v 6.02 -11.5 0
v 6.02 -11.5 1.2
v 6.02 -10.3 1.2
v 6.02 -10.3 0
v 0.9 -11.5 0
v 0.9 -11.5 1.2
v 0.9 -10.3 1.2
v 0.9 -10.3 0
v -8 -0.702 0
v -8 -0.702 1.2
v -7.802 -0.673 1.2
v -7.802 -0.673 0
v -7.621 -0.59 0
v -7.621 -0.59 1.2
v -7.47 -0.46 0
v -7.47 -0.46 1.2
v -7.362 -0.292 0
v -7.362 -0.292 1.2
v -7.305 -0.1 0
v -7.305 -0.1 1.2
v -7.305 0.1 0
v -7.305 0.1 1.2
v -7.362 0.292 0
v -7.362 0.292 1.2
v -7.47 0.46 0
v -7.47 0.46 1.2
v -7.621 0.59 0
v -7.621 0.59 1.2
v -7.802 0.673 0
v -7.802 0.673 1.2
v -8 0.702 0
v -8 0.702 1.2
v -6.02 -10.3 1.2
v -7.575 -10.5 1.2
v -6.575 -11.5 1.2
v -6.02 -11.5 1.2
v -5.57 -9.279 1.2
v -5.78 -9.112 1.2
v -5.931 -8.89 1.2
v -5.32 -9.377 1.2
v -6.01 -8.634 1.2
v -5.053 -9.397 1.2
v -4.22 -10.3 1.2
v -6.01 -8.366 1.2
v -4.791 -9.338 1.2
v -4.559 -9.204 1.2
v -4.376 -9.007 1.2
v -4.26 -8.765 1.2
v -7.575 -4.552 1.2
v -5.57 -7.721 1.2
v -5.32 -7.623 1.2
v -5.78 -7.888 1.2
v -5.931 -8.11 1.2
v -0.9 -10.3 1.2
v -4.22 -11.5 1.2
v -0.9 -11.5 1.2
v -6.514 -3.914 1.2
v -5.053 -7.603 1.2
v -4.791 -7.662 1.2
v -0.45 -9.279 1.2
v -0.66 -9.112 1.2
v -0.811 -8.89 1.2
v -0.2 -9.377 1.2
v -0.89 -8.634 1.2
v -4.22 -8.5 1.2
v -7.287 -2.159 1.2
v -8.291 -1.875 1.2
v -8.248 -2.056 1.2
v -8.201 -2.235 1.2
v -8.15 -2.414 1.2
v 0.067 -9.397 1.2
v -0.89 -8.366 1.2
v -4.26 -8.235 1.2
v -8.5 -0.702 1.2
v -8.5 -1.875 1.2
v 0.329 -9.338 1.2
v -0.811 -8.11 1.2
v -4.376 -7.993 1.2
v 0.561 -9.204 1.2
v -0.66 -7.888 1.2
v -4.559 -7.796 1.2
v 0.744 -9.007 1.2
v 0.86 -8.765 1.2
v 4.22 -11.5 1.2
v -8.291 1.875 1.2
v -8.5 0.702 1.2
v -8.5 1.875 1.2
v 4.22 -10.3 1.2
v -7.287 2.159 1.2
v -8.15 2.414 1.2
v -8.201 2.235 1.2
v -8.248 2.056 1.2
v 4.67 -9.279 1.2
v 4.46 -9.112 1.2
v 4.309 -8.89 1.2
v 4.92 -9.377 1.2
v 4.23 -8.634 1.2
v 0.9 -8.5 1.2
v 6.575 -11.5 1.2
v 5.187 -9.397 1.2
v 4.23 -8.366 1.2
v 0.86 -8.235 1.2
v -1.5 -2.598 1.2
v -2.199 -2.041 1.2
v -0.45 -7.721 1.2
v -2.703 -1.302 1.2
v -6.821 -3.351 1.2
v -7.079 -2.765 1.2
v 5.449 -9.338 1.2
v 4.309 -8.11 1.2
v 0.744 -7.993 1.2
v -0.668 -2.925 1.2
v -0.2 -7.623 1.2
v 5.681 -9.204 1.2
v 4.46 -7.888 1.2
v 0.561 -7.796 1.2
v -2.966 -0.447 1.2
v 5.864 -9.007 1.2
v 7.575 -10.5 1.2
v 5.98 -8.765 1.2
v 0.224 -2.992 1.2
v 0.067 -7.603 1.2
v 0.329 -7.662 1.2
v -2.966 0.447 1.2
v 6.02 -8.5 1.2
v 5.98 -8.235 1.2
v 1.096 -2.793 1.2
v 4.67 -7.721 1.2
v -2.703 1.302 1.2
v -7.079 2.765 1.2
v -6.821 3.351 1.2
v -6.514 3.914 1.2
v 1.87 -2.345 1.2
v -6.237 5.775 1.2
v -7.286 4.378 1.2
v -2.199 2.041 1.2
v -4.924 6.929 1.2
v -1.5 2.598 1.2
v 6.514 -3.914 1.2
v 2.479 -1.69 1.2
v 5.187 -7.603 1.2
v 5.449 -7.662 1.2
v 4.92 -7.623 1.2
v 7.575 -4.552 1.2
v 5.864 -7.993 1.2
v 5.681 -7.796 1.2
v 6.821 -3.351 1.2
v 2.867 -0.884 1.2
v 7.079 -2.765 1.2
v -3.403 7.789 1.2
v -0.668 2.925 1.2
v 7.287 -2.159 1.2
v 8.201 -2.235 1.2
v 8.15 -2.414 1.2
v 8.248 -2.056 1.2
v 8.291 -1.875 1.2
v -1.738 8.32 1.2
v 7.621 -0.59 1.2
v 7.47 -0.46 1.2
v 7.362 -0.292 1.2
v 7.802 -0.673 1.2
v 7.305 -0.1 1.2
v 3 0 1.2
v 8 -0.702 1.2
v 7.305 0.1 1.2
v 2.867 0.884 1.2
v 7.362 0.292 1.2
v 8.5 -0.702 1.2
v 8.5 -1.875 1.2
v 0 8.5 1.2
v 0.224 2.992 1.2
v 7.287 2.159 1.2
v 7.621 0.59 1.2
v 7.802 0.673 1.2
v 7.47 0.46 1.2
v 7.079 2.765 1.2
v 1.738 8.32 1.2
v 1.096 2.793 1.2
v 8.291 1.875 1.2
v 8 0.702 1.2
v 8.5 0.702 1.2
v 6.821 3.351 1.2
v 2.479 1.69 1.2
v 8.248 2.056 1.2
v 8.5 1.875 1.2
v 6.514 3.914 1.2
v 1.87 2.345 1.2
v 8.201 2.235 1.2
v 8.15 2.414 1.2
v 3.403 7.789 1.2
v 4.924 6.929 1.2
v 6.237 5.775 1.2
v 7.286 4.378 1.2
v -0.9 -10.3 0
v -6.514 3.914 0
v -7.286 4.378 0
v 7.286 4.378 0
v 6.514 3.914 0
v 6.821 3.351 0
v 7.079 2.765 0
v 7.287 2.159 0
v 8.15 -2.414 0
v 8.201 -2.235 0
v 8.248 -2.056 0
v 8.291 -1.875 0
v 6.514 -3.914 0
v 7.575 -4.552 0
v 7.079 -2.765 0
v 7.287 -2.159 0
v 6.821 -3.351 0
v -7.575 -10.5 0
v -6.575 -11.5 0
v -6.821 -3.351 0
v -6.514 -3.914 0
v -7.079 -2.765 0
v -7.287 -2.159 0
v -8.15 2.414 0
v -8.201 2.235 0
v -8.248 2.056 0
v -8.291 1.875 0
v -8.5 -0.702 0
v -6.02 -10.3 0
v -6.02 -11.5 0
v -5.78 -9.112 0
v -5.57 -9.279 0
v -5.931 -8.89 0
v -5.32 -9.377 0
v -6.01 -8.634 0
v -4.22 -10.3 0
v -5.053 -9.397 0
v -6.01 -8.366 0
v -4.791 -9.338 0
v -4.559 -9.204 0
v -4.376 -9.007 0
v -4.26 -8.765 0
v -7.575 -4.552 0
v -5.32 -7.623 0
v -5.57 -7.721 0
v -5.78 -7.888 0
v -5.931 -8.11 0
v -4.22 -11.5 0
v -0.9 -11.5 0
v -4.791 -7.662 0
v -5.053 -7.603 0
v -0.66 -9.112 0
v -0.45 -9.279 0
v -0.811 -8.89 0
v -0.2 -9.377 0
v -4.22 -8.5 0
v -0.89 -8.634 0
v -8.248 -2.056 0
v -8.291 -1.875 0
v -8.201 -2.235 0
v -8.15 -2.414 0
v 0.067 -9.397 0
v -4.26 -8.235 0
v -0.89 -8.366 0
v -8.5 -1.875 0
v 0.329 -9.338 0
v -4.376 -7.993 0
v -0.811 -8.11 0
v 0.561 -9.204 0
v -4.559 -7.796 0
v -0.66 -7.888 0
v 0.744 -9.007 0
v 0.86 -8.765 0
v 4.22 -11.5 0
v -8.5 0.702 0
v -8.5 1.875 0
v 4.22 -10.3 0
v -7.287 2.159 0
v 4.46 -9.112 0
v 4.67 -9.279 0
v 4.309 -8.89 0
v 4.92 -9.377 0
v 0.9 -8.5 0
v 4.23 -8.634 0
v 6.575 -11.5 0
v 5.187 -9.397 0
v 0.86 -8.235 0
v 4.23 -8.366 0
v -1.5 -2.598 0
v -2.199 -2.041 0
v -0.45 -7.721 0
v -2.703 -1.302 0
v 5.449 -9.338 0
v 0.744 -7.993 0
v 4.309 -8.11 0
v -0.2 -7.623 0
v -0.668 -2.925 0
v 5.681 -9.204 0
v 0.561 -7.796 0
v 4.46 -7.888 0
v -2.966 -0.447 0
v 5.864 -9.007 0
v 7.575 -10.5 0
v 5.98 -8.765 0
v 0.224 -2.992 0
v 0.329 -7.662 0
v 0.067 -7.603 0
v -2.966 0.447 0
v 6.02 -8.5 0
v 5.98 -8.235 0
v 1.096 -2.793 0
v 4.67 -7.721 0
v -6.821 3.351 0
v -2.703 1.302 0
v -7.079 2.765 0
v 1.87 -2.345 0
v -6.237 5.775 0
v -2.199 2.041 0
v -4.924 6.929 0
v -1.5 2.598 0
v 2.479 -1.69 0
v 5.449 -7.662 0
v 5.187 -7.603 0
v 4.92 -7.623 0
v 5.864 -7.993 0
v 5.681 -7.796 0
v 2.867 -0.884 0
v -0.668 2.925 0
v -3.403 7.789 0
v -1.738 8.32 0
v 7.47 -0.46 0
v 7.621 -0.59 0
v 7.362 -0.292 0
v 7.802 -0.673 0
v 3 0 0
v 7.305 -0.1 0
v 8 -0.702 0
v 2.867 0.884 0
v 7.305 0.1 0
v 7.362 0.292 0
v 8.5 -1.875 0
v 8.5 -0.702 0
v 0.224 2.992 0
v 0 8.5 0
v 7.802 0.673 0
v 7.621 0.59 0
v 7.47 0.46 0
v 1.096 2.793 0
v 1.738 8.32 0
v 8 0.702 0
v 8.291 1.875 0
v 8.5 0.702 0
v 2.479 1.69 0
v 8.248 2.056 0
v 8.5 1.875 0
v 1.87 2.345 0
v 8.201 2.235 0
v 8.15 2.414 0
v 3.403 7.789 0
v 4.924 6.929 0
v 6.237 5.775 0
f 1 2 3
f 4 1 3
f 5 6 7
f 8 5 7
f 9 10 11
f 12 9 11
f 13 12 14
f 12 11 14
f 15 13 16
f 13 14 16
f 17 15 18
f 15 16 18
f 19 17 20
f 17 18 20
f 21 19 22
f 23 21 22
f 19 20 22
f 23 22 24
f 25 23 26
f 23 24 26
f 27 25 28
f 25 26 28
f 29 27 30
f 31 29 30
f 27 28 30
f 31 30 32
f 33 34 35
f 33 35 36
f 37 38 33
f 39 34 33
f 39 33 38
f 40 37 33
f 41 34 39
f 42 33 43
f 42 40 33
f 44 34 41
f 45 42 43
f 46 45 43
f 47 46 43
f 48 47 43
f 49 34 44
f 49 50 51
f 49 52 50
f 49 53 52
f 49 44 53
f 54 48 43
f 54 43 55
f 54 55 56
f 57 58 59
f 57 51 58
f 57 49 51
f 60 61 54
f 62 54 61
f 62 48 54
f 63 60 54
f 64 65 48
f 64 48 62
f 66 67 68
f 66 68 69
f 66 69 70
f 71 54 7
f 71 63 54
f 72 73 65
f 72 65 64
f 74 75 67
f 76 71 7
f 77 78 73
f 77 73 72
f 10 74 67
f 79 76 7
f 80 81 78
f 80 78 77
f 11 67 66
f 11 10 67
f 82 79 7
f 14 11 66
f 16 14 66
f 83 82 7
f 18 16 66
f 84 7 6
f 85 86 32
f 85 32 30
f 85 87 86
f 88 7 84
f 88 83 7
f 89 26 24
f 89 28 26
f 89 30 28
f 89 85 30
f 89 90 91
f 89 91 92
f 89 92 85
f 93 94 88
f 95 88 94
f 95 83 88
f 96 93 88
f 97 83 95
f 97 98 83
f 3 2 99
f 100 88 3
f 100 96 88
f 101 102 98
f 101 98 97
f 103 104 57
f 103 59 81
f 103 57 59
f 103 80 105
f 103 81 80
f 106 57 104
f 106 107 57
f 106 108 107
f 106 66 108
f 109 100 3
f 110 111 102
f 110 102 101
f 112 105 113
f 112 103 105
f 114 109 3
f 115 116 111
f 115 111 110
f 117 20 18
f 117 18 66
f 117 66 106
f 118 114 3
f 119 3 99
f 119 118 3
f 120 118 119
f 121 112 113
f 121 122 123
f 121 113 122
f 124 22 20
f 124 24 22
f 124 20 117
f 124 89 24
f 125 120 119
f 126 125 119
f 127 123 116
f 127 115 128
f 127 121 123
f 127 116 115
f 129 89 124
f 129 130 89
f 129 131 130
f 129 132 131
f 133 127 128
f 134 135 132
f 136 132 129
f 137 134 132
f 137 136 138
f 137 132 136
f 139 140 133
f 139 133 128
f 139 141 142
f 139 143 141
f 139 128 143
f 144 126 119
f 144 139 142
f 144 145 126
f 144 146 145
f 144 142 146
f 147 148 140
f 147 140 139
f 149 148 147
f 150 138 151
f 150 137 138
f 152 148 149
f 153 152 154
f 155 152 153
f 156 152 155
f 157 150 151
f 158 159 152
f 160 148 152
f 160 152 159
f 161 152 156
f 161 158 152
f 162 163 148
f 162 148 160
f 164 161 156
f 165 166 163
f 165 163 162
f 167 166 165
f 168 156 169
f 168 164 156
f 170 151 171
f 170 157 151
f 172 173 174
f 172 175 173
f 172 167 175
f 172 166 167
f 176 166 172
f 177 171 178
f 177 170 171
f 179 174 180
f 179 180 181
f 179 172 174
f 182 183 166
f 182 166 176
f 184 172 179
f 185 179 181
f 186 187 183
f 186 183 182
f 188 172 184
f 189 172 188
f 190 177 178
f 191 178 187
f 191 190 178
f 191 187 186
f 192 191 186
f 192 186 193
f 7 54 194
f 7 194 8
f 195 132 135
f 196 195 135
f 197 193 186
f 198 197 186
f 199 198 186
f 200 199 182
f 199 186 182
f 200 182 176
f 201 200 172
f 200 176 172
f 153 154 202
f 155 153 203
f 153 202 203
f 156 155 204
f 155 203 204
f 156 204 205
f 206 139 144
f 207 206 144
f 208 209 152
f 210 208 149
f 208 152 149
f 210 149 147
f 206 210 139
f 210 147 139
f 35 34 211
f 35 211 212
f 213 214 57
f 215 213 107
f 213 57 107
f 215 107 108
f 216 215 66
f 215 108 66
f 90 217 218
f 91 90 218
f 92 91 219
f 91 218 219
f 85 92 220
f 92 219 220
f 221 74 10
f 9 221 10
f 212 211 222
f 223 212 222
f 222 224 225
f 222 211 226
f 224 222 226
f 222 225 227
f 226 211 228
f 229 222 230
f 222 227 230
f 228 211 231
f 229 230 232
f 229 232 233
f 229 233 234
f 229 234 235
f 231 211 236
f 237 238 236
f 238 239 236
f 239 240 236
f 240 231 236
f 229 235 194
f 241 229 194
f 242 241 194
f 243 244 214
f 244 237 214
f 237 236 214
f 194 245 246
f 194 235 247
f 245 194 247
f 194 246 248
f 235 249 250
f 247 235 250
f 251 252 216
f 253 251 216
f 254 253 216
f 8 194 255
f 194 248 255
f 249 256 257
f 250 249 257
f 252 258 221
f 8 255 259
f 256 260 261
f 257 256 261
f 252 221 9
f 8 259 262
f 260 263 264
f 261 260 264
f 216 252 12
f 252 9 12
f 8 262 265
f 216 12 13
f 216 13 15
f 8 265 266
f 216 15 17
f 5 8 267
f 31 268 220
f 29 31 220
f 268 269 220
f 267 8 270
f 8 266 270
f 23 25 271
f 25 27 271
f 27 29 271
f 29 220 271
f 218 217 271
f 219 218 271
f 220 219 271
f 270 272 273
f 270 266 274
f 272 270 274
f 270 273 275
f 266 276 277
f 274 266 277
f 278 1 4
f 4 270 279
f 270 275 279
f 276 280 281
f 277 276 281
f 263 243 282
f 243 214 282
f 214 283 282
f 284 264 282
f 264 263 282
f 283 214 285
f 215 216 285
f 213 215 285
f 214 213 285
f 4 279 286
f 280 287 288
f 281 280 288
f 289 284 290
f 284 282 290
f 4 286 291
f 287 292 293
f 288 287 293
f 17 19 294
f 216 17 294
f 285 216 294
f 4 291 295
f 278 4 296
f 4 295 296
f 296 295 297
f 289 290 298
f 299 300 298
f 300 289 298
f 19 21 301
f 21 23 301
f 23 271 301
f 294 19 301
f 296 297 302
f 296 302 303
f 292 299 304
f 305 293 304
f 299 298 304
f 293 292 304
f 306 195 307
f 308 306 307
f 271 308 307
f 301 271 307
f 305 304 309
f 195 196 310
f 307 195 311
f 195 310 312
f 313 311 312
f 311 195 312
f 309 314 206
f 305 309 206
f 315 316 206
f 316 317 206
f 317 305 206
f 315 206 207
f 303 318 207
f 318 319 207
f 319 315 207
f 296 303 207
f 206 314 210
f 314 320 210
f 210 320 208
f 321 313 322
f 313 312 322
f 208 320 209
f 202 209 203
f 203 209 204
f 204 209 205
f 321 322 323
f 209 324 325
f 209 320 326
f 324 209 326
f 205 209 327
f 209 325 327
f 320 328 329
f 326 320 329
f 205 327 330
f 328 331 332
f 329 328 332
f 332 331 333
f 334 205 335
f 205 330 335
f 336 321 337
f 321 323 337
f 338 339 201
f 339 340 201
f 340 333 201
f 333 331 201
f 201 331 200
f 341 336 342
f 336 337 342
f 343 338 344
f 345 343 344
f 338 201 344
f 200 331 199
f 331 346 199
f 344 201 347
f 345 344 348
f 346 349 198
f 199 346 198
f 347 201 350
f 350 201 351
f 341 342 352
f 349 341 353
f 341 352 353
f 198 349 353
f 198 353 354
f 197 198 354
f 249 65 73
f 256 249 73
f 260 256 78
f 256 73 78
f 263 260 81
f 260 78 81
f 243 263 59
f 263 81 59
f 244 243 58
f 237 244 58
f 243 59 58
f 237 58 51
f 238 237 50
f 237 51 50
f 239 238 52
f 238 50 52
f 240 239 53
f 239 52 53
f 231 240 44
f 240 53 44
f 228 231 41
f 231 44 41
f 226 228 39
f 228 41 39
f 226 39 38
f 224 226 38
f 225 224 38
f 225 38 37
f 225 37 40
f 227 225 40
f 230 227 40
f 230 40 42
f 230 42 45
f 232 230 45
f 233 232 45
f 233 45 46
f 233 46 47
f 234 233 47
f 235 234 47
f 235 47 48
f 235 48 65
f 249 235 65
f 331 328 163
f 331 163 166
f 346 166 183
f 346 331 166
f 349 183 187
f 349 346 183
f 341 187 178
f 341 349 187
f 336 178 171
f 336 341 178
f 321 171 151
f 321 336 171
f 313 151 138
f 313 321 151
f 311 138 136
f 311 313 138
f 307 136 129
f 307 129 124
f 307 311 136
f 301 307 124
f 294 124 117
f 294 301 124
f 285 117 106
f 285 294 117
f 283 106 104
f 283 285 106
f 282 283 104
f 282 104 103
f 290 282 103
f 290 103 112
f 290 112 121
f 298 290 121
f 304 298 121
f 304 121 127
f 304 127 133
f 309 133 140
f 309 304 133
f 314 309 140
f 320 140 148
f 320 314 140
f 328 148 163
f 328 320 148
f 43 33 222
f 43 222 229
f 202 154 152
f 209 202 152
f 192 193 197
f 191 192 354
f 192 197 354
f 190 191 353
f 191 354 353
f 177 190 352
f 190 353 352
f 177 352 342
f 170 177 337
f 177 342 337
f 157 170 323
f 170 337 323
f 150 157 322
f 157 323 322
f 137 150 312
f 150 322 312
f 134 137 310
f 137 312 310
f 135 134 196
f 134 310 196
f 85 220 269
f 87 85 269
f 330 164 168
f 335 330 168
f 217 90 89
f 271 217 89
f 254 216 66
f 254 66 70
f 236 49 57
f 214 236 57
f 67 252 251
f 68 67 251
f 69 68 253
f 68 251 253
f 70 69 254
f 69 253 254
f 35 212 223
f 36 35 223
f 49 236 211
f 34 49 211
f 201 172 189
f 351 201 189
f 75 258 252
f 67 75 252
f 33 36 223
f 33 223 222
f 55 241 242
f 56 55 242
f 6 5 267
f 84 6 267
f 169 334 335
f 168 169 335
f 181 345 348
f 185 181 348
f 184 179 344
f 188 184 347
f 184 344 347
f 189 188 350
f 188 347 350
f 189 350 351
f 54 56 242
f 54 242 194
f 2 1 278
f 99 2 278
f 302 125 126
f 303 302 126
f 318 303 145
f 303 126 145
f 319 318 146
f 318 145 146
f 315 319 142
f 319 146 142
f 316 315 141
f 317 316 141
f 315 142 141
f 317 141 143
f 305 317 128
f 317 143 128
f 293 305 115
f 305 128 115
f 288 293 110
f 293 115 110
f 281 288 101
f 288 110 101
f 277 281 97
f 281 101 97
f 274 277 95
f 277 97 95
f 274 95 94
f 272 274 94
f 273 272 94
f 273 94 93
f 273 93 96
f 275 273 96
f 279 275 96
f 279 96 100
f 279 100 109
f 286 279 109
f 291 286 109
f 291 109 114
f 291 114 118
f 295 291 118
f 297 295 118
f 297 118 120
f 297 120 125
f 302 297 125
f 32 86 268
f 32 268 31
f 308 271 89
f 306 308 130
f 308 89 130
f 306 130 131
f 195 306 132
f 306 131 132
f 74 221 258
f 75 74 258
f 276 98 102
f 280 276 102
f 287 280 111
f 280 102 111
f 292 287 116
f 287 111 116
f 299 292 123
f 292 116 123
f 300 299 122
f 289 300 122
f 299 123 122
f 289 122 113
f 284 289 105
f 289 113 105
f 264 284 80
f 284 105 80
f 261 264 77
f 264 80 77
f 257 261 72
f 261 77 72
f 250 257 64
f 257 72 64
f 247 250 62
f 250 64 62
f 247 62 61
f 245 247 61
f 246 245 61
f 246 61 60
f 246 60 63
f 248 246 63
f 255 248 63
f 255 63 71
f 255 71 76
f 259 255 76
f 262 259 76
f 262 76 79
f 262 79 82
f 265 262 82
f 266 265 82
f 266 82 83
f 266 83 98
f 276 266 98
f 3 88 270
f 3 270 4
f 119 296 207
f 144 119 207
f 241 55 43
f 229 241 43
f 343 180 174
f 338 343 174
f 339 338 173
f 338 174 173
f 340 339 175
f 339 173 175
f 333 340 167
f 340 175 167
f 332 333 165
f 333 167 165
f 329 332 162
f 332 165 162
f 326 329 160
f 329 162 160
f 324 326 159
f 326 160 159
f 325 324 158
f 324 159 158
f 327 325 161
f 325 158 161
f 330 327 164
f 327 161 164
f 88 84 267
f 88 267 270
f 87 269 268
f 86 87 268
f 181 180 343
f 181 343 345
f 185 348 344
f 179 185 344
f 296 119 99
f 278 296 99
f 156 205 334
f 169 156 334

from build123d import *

# Parameters (mm, degrees)
SKETCH1_R           = 3
BOSS_EXTRUDE1_DEPTH = 1.2
SKETCH2_R           = 0.9
SKETCH2_W           = 1.8
SKETCH2_H           = 1.2
CUT_EXTRUDE1_DEPTH  = 2.2
SKETCH3_R           = 0.701713619
SKETCH3_W           = 1
SKETCH3_H           = 1.403427238
CUT_EXTRUDE2_DEPTH  = 10


with BuildPart() as part:
    # Sketch1 → Boss-Extrude1 (new body)
    with BuildSketch(Plane.XY):
        with BuildLine():
            Line((-7.575, -3.856082857), (-7.575, -11.5))
            Line((-7.575, -11.5), (7.575, -11.5))
            Line((7.575, -11.5), (7.575, -3.856082857))
            ThreePointArc((7.575, -3.856082857), (7.994413326, -2.887794239), (8.290619699, -1.875))
            Line((8.290619699, -1.875), (8.5, -1.875))
            Line((8.5, -1.875), (8.5, 1.875))
            Line((8.5, 1.875), (8.290619699, 1.875))
            ThreePointArc((8.290619699, 1.875), (0, 8.5), (-8.290619699, 1.875))
            Line((-8.290619699, 1.875), (-8.5, 1.875))
            Line((-8.5, 1.875), (-8.5, -1.875))
            Line((-8.5, -1.875), (-8.290619699, -1.875))
            ThreePointArc((-8.290619699, -1.875), (-7.994413326, -2.887794239), (-7.575, -3.856082857))
        make_face()
        Circle(SKETCH1_R, mode=Mode.SUBTRACT)
    extrude(amount=BOSS_EXTRUDE1_DEPTH)

    # Sketch2 → Cut-Extrude1 (cut, through all)
    with BuildSketch(Plane.XY.offset(1.2)):
        with Locations((0, -8.5)):
            Circle(SKETCH2_R)
        with Locations((5.12, -8.5)):
            Circle(SKETCH2_R)
        with Locations((-5.12, -8.5)):
            Circle(SKETCH2_R)
        with Locations((5.12, -10.9)):
            Rectangle(SKETCH2_W, SKETCH2_H)
        with Locations((0, -10.9)):
            Rectangle(SKETCH2_W, SKETCH2_H)
        with Locations((-5.12, -10.9)):
            Rectangle(SKETCH2_W, SKETCH2_H)
        Polygon((7.575, -11.5), (7.575, -10.5), (6.575, -11.5), align=None)
        Polygon((-6.575, -11.5), (-7.575, -11.5), (-7.575, -10.5), align=None)
    extrude(amount=-CUT_EXTRUDE1_DEPTH, mode=Mode.SUBTRACT)

    # Sketch3 → Cut-Extrude2 (cut)
    with BuildSketch(Plane.XY.offset(1.2)):
        with Locations((8, 0)):
            Circle(SKETCH3_R)
        with Locations((-8, 0)):
            Circle(SKETCH3_R)
        with BuildLine():
            Line((7.287029985, 2.15851662), (9.119724122, 2.701385355))
            Line((9.119724122, 2.701385355), (8.018790887, 4.818175656))
            Line((8.018790887, 4.818175656), (6.514471485, 3.914289369))
            ThreePointArc((6.514471485, 3.914289369), (6.956367241, 3.060874843), (7.287029985, 2.15851662))
        make_face()
        with BuildLine():
            Line((8.018790887, -4.818175656), (9.119724122, -2.701385355))
            Line((9.119724122, -2.701385355), (7.287029985, -2.15851662))
            ThreePointArc((7.287029985, -2.15851662), (6.956367241, -3.060874843), (6.514471485, -3.914289369))
            Line((6.514471485, -3.914289369), (8.018790887, -4.818175656))
        make_face()
        with BuildLine():
            Line((-7.287029985, -2.15851662), (-9.119724122, -2.701385355))
            Line((-9.119724122, -2.701385355), (-8.018790887, -4.818175656))
            Line((-8.018790887, -4.818175656), (-6.514471485, -3.914289369))
            ThreePointArc((-6.514471485, -3.914289369), (-6.956367241, -3.060874843), (-7.287029985, -2.15851662))
        make_face()
        with BuildLine():
            Line((-8.018790887, 4.818175656), (-9.119724122, 2.701385355))
            Line((-9.119724122, 2.701385355), (-7.287029985, 2.15851662))
            ThreePointArc((-7.287029985, 2.15851662), (-6.956367241, 3.060874843), (-6.514471485, 3.914289369))
            Line((-6.514471485, 3.914289369), (-8.018790887, 4.818175656))
        make_face()
        with Locations((-8.5, 0)):
            Rectangle(SKETCH3_W, SKETCH3_H)
        with Locations((8.5, 0)):
            Rectangle(SKETCH3_W, SKETCH3_H)
    extrude(amount=-CUT_EXTRUDE2_DEPTH, mode=Mode.SUBTRACT)


solid = part.part
